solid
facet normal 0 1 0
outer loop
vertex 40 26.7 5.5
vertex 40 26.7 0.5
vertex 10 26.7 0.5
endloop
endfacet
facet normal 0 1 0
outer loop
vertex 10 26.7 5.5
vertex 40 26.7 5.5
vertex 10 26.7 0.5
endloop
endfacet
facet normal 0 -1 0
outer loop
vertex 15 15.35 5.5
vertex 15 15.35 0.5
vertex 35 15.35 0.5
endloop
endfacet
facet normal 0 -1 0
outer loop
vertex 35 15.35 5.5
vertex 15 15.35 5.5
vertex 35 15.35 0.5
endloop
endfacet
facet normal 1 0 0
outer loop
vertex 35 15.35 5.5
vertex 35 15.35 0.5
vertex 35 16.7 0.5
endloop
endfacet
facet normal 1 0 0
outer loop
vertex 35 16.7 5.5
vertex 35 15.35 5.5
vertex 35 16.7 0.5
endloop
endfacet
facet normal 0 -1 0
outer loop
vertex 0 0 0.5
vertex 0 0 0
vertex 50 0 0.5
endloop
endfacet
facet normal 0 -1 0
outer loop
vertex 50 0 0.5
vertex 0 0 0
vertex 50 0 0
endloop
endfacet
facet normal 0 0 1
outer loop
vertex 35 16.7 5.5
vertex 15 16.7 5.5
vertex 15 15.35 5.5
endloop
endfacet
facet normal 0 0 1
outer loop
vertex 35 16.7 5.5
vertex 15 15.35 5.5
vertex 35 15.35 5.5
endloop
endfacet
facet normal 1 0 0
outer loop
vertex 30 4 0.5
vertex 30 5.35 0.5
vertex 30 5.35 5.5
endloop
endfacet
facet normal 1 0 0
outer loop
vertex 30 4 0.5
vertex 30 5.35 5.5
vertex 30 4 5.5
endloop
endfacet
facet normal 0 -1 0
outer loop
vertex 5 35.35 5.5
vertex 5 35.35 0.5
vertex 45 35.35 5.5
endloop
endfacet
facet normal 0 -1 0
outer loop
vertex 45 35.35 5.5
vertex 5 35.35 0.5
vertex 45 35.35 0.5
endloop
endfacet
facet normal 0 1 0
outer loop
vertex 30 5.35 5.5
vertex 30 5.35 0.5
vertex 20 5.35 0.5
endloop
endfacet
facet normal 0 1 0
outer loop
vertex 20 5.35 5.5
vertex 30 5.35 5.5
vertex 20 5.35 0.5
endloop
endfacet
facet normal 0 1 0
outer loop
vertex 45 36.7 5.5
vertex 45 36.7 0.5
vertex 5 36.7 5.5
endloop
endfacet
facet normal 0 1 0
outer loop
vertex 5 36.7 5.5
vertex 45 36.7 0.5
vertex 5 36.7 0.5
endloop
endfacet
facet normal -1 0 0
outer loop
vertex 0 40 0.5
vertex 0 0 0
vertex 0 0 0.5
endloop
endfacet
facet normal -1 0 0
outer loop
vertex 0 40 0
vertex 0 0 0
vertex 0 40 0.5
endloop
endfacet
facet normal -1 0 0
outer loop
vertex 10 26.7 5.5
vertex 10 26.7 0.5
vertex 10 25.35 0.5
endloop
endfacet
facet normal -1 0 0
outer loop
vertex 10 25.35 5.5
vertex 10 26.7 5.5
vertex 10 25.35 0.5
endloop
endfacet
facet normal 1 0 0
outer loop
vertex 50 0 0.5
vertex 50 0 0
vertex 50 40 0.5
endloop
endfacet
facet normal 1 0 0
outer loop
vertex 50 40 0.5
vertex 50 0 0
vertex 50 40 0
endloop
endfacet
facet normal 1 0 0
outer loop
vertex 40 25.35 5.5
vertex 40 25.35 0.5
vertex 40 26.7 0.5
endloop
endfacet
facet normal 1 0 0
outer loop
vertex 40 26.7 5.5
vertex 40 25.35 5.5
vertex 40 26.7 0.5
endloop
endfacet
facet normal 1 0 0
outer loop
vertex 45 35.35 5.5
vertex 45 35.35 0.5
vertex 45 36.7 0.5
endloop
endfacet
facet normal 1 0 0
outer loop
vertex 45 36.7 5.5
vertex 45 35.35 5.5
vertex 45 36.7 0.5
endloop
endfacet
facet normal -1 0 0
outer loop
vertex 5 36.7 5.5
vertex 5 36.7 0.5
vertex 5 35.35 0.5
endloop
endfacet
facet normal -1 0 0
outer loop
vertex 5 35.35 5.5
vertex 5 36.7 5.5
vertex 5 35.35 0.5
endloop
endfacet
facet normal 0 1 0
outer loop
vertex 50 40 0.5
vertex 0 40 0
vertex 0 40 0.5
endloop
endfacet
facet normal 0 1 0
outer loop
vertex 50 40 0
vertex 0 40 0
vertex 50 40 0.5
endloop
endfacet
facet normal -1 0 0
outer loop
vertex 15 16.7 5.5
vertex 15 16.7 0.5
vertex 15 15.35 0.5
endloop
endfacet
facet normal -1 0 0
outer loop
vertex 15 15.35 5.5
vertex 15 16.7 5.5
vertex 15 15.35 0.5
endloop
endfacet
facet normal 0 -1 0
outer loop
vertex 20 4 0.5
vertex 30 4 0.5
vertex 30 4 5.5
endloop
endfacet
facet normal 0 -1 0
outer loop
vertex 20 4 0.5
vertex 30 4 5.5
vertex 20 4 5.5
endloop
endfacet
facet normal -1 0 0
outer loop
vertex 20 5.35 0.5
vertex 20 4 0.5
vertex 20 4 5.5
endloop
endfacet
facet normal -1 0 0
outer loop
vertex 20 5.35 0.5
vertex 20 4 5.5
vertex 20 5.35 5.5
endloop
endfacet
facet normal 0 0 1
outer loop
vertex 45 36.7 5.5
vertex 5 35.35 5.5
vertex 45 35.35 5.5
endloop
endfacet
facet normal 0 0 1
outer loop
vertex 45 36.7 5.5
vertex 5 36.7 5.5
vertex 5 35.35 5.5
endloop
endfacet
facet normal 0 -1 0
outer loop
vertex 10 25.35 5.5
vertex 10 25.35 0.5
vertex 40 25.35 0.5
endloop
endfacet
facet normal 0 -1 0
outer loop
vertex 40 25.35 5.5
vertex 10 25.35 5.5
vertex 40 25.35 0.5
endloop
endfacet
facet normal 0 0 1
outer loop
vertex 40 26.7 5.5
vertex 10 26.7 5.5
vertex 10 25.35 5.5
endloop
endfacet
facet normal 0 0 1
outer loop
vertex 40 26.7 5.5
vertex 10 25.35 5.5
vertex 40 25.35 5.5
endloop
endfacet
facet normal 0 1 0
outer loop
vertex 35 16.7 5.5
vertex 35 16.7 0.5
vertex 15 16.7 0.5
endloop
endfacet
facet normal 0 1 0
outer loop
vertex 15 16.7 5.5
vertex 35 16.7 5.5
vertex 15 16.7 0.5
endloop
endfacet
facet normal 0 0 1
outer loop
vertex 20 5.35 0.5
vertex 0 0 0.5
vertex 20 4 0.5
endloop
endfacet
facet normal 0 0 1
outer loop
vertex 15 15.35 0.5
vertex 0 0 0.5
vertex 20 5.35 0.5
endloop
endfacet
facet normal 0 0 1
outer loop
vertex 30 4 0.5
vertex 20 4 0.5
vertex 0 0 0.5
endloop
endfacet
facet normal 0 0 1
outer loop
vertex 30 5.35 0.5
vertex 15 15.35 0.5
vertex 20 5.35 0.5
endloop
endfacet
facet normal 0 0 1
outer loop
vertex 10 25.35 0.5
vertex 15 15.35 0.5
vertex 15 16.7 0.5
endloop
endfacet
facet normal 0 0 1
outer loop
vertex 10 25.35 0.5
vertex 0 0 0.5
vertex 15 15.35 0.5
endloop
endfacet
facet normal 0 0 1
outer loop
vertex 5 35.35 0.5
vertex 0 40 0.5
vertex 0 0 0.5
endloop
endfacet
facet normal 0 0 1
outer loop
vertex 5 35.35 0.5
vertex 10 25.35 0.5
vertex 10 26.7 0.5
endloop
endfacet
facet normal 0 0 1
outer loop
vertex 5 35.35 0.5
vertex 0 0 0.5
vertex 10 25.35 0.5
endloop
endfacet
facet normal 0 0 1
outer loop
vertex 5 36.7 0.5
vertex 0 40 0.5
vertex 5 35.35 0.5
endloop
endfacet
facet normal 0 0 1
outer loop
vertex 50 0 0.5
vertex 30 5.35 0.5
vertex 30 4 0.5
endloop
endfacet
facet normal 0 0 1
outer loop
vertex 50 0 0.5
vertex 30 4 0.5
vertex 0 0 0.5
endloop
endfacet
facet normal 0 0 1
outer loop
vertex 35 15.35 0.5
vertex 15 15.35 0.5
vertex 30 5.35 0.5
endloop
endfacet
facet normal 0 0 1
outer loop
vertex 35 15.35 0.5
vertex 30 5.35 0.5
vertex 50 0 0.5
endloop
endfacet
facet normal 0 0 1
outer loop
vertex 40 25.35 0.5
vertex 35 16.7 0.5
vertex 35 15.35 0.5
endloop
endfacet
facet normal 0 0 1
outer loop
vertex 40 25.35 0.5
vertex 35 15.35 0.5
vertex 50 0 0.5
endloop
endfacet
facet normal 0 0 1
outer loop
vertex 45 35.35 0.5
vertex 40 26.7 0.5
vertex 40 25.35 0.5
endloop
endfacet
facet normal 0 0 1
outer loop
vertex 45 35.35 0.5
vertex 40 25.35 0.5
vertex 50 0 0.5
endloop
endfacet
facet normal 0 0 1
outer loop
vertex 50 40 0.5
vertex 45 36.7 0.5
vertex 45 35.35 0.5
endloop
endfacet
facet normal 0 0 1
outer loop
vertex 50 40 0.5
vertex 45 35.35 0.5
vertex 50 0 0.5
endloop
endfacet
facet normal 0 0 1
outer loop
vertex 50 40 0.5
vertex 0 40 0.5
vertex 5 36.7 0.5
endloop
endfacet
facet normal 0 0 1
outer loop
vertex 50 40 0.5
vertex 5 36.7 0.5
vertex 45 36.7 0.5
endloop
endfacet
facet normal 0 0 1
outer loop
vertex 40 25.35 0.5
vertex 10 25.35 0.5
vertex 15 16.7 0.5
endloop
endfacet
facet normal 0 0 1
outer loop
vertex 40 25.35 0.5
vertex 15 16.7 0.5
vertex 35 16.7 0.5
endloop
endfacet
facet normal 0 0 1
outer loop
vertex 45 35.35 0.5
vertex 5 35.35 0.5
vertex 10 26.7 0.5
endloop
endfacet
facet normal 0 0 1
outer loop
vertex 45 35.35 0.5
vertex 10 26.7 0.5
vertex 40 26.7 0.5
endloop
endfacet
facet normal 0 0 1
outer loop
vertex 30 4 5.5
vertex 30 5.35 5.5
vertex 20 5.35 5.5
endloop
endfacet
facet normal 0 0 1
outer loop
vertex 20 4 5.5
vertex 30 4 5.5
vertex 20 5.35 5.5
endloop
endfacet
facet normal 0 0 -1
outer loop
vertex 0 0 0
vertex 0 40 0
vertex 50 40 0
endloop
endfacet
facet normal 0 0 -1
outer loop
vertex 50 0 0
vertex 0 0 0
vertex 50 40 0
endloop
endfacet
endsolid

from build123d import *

# Parameters (mm, degrees)
SKETCH_W     = 50
SKETCH_H     = 40
PAD_DEPTH    = 0.5
PAD001_DEPTH = 5


with BuildPart() as part:
    # Sketch → Pad (new body)
    with BuildSketch(Plane.XY):
        with Locations((25, 20)):
            Rectangle(SKETCH_W, SKETCH_H)
    extrude(amount=PAD_DEPTH)

    # Sketch001 (on Face6 of Pad) → Pad001 (join)
    with BuildSketch(Plane.XY.offset(0.5)):
        Polygon((30, 5.35), (30, 4), (20, 4), (20, 5.35), (25, 5.35), align=None)
        Polygon((35, 15.35), (35, 16.7), (25, 16.7), (15, 16.7), (15, 15.35), (25, 15.35), align=None)
        Polygon((40, 25.35), (40, 26.7), (25, 26.7), (10, 26.7), (10, 25.35), (25, 25.35), align=None)
        Polygon((5, 35.35), (45, 35.35), (45, 36.7), (25, 36.7), (5, 36.7), align=None)
    extrude(amount=PAD001_DEPTH)


solid = part.part
